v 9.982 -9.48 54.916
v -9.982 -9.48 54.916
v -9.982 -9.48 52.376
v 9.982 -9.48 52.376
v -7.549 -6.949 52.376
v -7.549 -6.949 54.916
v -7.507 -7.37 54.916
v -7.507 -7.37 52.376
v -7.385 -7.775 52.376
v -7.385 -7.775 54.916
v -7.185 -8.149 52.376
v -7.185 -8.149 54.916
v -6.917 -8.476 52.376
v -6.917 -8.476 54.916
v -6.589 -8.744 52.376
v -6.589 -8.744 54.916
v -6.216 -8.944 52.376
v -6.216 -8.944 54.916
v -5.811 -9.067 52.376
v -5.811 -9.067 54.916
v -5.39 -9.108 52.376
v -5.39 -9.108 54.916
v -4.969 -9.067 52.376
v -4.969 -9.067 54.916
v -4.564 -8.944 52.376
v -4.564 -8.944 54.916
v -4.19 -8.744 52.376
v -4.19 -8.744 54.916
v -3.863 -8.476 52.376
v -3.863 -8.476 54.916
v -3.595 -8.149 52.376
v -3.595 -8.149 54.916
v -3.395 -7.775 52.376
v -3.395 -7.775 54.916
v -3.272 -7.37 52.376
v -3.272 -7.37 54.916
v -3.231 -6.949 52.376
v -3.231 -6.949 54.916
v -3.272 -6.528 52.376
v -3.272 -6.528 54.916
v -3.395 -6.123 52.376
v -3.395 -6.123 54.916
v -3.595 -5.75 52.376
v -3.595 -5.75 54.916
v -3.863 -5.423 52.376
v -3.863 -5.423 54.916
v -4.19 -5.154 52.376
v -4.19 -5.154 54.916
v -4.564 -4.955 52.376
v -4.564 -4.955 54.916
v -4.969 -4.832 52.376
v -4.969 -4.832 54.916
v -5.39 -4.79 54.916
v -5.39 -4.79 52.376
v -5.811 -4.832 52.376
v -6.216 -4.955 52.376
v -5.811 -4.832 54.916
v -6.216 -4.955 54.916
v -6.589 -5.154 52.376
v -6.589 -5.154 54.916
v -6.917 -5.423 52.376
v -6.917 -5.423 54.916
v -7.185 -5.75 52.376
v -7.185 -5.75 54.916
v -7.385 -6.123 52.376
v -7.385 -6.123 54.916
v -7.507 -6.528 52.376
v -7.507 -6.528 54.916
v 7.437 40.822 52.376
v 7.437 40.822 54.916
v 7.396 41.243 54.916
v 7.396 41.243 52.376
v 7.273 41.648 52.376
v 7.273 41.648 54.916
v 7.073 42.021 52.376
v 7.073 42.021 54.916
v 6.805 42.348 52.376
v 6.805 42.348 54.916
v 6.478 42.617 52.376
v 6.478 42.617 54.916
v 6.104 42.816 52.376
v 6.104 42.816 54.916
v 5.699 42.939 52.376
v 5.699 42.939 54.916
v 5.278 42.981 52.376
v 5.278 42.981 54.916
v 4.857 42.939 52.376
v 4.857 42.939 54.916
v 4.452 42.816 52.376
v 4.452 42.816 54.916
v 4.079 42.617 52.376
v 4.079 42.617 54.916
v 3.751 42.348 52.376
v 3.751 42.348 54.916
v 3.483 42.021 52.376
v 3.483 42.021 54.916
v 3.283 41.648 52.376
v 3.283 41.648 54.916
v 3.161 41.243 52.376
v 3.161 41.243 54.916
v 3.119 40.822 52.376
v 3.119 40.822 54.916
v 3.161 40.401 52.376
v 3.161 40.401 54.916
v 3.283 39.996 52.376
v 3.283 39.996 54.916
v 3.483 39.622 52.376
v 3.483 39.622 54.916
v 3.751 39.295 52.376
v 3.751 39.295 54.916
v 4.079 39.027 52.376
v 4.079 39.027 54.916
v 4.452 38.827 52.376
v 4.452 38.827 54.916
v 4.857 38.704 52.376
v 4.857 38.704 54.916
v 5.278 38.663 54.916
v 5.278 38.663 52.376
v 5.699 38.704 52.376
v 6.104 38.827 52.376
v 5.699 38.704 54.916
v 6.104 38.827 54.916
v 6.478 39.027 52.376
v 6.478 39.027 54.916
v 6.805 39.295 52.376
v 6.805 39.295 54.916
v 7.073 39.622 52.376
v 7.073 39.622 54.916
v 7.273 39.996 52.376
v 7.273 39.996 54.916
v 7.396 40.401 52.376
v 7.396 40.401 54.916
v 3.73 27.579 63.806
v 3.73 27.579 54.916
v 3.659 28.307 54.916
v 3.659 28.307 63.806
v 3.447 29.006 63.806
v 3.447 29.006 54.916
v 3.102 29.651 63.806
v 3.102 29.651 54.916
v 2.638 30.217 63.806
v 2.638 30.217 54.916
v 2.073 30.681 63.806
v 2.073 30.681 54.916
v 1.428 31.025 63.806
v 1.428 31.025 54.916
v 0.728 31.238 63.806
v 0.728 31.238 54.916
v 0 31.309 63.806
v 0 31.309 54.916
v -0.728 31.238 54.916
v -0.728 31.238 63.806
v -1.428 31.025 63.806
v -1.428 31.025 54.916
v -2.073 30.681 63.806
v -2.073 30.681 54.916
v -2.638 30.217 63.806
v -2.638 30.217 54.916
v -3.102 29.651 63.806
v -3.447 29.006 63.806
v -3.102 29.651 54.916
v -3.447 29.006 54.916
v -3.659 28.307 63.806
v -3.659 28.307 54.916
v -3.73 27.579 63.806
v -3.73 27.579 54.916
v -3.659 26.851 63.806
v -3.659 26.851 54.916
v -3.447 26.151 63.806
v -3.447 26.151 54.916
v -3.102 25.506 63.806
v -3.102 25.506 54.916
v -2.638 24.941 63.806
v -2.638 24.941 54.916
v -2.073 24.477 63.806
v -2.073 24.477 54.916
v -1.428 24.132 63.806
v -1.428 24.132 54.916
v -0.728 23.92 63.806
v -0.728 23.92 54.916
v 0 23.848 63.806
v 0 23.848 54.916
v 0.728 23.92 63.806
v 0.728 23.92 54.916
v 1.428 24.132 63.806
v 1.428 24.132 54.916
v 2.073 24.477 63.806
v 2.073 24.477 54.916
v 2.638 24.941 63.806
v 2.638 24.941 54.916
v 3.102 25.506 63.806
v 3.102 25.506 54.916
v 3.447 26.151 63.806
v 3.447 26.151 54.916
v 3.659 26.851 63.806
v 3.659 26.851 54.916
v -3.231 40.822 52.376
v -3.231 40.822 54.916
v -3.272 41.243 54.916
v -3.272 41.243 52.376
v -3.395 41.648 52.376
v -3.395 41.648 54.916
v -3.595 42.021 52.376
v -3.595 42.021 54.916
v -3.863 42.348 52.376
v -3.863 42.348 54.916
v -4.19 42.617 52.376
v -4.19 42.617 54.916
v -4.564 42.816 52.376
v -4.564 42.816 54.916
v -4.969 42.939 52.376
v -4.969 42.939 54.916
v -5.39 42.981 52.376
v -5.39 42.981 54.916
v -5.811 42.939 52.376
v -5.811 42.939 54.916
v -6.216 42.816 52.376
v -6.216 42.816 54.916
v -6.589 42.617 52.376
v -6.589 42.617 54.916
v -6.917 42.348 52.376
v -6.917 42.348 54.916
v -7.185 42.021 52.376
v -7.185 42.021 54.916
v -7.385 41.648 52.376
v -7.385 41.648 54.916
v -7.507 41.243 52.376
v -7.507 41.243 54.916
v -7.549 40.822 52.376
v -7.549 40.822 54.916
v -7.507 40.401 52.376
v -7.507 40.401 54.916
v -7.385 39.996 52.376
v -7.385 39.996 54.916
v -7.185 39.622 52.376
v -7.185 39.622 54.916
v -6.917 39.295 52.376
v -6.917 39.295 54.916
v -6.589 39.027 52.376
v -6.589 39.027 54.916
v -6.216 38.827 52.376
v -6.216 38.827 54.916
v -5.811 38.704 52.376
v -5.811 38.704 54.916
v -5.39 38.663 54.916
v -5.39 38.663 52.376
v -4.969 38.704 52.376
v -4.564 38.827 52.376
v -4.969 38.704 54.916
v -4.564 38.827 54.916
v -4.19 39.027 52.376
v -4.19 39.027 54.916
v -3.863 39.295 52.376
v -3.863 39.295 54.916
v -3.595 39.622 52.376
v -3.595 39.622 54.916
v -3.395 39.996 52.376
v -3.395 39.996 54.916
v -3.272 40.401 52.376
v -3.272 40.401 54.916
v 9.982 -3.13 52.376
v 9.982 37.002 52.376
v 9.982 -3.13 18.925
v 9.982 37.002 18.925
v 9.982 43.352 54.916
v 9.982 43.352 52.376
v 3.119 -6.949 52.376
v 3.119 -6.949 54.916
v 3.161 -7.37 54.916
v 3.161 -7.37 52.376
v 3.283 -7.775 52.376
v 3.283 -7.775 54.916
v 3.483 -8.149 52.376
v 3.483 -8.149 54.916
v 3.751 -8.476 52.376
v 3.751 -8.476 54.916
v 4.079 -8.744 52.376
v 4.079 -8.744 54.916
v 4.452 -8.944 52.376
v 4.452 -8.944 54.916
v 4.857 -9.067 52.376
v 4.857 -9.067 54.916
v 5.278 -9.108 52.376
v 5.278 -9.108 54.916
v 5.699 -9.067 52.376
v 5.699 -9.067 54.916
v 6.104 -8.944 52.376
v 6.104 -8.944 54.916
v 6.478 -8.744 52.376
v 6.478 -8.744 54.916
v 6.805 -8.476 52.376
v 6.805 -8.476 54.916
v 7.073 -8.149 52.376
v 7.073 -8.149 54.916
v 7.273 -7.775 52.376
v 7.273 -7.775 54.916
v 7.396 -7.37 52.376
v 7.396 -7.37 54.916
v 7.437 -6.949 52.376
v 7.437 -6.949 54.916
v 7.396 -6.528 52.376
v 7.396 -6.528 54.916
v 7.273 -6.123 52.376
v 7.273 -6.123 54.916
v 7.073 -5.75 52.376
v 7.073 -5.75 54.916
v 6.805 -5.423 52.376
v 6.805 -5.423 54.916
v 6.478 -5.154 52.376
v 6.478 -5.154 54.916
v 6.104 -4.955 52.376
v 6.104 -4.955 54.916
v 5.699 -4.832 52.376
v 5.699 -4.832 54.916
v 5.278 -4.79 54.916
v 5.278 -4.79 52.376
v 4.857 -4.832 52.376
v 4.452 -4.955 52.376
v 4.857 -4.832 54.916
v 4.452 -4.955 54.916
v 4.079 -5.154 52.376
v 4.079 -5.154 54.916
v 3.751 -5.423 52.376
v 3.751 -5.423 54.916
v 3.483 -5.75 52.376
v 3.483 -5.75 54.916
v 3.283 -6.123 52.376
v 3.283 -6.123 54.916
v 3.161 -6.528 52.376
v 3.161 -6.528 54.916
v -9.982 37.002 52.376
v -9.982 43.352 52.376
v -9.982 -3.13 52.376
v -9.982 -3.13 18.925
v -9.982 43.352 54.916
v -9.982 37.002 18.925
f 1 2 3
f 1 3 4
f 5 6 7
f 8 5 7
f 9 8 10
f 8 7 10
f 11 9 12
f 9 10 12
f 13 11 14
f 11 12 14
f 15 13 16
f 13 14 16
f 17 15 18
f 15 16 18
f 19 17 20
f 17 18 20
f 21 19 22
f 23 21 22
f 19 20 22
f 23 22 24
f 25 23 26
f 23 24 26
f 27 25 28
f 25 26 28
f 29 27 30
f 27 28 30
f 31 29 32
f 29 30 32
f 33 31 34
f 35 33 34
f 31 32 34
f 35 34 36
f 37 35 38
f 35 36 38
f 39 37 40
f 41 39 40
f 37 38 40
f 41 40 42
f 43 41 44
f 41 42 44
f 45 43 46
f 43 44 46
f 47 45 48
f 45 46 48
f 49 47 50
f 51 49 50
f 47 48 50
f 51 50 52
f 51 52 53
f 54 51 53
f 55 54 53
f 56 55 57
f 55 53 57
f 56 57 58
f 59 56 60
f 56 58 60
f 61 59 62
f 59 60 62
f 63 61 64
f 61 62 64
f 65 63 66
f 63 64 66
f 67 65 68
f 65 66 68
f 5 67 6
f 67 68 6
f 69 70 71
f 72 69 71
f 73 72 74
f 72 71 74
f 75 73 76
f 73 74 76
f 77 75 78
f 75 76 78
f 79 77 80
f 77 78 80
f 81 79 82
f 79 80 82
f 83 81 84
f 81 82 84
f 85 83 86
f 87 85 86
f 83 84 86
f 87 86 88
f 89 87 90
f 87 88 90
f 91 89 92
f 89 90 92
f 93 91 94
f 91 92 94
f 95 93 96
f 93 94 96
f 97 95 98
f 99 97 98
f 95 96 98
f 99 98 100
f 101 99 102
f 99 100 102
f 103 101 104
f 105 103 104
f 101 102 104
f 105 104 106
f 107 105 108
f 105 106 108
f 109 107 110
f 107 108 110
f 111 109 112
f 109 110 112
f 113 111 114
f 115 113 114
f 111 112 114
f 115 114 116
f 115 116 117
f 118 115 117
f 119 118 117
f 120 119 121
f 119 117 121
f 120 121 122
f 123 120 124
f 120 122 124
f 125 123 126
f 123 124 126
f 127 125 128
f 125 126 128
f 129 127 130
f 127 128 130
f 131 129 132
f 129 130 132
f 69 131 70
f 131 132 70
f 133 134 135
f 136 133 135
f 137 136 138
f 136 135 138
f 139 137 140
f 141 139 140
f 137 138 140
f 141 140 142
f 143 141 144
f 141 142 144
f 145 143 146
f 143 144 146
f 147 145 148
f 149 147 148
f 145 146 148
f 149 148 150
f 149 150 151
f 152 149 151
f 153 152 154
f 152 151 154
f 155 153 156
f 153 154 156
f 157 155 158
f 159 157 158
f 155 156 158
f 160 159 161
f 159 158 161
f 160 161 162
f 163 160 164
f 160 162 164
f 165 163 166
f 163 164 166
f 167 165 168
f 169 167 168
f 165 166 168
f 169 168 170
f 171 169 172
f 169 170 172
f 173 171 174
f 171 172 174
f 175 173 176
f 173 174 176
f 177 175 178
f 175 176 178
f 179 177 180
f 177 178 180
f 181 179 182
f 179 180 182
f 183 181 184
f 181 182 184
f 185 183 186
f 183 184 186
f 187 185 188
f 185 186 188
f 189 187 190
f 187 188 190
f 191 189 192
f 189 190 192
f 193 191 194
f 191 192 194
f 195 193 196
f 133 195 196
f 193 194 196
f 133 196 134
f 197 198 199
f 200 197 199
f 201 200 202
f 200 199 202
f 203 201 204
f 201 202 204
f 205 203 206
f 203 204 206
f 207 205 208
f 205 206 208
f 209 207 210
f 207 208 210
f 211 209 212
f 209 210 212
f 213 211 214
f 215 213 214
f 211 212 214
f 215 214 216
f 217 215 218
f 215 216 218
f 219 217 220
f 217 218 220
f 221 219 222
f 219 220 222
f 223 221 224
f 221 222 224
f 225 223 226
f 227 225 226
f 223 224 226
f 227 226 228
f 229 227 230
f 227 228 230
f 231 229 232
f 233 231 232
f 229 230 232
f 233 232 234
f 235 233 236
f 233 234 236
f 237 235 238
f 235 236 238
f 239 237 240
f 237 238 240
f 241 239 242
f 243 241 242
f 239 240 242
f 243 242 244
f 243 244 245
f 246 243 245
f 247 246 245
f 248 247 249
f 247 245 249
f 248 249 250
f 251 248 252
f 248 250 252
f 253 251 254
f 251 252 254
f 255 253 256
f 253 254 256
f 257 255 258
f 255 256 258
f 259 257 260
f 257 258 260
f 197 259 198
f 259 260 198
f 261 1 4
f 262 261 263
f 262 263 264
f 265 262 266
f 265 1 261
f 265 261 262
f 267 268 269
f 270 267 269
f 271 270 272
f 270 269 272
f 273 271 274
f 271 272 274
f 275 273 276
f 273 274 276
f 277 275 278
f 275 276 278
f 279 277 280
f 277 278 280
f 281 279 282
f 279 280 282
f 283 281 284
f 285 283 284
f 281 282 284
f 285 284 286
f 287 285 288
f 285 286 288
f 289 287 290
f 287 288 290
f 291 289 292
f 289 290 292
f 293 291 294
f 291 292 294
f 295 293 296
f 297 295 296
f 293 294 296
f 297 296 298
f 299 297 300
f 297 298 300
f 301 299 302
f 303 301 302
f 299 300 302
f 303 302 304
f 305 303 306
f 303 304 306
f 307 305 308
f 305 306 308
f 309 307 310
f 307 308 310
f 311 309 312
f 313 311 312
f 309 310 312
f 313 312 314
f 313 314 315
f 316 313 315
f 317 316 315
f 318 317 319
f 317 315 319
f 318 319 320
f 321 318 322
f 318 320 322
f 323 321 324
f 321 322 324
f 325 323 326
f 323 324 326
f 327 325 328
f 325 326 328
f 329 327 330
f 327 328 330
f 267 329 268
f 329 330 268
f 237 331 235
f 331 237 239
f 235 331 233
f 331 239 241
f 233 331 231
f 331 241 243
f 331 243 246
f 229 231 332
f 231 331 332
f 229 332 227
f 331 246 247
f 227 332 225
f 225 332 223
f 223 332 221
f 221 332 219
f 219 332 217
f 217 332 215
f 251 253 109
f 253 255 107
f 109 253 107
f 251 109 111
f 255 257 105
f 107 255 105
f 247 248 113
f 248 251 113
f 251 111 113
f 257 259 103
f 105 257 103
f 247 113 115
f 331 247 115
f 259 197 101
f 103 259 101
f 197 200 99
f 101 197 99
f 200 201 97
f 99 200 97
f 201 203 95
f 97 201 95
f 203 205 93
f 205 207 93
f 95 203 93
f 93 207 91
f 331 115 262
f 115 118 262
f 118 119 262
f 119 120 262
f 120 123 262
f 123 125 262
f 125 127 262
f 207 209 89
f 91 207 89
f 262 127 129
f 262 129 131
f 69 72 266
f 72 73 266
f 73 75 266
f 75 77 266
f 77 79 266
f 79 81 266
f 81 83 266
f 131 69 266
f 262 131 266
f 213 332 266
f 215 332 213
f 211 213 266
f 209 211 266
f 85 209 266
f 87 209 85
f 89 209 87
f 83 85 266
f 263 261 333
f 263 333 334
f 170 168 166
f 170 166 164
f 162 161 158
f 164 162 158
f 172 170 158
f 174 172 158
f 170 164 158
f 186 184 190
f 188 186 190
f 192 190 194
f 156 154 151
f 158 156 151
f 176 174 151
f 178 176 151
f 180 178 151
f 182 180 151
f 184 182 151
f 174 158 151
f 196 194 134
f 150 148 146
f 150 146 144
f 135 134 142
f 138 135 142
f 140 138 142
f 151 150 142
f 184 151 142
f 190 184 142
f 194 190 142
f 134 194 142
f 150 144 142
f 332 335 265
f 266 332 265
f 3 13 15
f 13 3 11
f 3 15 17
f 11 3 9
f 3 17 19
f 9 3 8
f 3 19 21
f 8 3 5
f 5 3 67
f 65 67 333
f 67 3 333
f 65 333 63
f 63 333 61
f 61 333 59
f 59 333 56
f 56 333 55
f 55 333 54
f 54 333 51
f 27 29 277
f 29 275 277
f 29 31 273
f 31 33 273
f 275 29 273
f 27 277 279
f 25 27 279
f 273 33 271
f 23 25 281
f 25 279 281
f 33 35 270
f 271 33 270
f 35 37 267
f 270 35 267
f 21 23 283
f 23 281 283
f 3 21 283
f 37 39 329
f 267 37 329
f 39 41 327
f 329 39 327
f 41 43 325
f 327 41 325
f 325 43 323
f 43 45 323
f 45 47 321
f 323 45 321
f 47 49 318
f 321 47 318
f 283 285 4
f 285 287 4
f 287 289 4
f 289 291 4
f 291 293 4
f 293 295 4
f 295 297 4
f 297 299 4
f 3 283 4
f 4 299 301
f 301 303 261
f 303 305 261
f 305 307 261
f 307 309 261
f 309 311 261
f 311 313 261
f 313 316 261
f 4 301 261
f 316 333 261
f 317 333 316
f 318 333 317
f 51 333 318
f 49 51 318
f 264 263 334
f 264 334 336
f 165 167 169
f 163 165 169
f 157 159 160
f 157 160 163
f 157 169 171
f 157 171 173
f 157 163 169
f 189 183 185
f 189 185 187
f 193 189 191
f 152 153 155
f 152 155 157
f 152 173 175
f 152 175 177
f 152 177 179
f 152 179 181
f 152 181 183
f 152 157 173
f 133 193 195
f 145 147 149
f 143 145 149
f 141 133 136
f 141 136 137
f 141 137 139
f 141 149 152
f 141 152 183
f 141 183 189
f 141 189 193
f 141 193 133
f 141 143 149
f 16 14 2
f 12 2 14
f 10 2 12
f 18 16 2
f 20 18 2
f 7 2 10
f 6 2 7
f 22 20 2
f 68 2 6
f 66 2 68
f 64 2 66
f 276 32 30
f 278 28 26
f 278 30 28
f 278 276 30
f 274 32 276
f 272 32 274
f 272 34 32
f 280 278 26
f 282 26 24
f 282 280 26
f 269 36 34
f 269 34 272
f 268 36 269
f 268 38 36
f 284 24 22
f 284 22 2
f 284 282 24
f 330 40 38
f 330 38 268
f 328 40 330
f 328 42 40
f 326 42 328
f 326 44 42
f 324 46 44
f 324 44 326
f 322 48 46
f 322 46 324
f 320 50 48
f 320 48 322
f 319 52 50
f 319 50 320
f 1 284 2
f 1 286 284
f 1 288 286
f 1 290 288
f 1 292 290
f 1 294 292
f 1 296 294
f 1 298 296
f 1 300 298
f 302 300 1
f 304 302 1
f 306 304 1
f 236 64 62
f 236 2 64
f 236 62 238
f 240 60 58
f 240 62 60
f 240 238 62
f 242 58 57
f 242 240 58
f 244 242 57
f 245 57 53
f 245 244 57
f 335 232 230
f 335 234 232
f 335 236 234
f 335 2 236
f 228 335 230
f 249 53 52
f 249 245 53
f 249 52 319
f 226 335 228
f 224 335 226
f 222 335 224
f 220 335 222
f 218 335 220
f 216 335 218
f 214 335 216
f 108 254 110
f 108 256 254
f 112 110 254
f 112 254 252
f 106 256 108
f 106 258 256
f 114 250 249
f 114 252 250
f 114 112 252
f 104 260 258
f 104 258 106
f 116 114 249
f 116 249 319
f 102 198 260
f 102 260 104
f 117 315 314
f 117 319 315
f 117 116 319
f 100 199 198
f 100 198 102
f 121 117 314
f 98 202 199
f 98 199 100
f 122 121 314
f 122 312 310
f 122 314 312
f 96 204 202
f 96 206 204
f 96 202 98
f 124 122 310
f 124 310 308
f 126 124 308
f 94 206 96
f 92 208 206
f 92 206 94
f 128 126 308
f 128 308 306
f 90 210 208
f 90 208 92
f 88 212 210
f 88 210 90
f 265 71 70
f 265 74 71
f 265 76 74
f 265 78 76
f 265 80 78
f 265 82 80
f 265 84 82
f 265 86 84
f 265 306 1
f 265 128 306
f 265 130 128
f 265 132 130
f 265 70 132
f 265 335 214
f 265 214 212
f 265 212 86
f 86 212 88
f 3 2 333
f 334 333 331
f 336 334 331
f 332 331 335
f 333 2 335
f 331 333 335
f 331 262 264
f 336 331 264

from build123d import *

# Parameters (mm, degrees)
SKETCH1_W      = 35.9918
SKETCH1_H      = 40.132
EXTRUDE1_DEPTH = 9.9822
SKETCH2_R      = 3.730476731
EXTRUDE2_DEPTH = 8.89
SKETCH5_W      = 19.9644
SKETCH5_H      = 6.35
SKETCH5_R      = 2.159
EXTRUDE5_DEPTH = 2.54


with BuildPart() as part:
    # Sketch1 → Extrude1 (new, symmetric)
    with BuildSketch(Plane(origin=(0, 0, 0), x_dir=(0, 0, -1), z_dir=(1, 0, 0))):
        with Locations((-36.920443218, 16.936283292)):
            Rectangle(SKETCH1_W, SKETCH1_H)
    extrude(amount=EXTRUDE1_DEPTH, both=True)

    # Sketch5 → Extrude5 (add)
    # profile 1 of 2: a face of its own
    with BuildSketch(Plane.XY.offset(54.916343218)):
        with Locations((0, 40.177283292)):
            Rectangle(SKETCH5_W, SKETCH5_H)
        with Locations((5.278089528, 40.821765348)):
            Circle(SKETCH5_R, mode=Mode.SUBTRACT)
        with Locations((-5.389910472, 40.821765348)):
            Circle(SKETCH5_R, mode=Mode.SUBTRACT)
    # profile 2 of 2: a face of its own
    with BuildSketch(Plane.XY.offset(54.916343218)):
        with Locations((0, -6.304716708)):
            Rectangle(SKETCH5_W, SKETCH5_H)
        with Locations(Location((-5.389910472, -6.949198764, 0), (0, 0, 180))):
            Circle(SKETCH5_R, mode=Mode.SUBTRACT)
        with Locations(Location((5.278089528, -6.949198764, 0), (0, 0, 180))):
            Circle(SKETCH5_R, mode=Mode.SUBTRACT)
    extrude(amount=-EXTRUDE5_DEPTH)


with BuildPart() as body_2:
    # Sketch2 → Extrude2 (new body)
    with BuildSketch(Plane.XY.offset(54.916343218)):
        with Locations((0, 27.578883292)):
            Circle(SKETCH2_R)
    extrude(amount=EXTRUDE2_DEPTH)


solid = Compound([part.part, body_2.part])
